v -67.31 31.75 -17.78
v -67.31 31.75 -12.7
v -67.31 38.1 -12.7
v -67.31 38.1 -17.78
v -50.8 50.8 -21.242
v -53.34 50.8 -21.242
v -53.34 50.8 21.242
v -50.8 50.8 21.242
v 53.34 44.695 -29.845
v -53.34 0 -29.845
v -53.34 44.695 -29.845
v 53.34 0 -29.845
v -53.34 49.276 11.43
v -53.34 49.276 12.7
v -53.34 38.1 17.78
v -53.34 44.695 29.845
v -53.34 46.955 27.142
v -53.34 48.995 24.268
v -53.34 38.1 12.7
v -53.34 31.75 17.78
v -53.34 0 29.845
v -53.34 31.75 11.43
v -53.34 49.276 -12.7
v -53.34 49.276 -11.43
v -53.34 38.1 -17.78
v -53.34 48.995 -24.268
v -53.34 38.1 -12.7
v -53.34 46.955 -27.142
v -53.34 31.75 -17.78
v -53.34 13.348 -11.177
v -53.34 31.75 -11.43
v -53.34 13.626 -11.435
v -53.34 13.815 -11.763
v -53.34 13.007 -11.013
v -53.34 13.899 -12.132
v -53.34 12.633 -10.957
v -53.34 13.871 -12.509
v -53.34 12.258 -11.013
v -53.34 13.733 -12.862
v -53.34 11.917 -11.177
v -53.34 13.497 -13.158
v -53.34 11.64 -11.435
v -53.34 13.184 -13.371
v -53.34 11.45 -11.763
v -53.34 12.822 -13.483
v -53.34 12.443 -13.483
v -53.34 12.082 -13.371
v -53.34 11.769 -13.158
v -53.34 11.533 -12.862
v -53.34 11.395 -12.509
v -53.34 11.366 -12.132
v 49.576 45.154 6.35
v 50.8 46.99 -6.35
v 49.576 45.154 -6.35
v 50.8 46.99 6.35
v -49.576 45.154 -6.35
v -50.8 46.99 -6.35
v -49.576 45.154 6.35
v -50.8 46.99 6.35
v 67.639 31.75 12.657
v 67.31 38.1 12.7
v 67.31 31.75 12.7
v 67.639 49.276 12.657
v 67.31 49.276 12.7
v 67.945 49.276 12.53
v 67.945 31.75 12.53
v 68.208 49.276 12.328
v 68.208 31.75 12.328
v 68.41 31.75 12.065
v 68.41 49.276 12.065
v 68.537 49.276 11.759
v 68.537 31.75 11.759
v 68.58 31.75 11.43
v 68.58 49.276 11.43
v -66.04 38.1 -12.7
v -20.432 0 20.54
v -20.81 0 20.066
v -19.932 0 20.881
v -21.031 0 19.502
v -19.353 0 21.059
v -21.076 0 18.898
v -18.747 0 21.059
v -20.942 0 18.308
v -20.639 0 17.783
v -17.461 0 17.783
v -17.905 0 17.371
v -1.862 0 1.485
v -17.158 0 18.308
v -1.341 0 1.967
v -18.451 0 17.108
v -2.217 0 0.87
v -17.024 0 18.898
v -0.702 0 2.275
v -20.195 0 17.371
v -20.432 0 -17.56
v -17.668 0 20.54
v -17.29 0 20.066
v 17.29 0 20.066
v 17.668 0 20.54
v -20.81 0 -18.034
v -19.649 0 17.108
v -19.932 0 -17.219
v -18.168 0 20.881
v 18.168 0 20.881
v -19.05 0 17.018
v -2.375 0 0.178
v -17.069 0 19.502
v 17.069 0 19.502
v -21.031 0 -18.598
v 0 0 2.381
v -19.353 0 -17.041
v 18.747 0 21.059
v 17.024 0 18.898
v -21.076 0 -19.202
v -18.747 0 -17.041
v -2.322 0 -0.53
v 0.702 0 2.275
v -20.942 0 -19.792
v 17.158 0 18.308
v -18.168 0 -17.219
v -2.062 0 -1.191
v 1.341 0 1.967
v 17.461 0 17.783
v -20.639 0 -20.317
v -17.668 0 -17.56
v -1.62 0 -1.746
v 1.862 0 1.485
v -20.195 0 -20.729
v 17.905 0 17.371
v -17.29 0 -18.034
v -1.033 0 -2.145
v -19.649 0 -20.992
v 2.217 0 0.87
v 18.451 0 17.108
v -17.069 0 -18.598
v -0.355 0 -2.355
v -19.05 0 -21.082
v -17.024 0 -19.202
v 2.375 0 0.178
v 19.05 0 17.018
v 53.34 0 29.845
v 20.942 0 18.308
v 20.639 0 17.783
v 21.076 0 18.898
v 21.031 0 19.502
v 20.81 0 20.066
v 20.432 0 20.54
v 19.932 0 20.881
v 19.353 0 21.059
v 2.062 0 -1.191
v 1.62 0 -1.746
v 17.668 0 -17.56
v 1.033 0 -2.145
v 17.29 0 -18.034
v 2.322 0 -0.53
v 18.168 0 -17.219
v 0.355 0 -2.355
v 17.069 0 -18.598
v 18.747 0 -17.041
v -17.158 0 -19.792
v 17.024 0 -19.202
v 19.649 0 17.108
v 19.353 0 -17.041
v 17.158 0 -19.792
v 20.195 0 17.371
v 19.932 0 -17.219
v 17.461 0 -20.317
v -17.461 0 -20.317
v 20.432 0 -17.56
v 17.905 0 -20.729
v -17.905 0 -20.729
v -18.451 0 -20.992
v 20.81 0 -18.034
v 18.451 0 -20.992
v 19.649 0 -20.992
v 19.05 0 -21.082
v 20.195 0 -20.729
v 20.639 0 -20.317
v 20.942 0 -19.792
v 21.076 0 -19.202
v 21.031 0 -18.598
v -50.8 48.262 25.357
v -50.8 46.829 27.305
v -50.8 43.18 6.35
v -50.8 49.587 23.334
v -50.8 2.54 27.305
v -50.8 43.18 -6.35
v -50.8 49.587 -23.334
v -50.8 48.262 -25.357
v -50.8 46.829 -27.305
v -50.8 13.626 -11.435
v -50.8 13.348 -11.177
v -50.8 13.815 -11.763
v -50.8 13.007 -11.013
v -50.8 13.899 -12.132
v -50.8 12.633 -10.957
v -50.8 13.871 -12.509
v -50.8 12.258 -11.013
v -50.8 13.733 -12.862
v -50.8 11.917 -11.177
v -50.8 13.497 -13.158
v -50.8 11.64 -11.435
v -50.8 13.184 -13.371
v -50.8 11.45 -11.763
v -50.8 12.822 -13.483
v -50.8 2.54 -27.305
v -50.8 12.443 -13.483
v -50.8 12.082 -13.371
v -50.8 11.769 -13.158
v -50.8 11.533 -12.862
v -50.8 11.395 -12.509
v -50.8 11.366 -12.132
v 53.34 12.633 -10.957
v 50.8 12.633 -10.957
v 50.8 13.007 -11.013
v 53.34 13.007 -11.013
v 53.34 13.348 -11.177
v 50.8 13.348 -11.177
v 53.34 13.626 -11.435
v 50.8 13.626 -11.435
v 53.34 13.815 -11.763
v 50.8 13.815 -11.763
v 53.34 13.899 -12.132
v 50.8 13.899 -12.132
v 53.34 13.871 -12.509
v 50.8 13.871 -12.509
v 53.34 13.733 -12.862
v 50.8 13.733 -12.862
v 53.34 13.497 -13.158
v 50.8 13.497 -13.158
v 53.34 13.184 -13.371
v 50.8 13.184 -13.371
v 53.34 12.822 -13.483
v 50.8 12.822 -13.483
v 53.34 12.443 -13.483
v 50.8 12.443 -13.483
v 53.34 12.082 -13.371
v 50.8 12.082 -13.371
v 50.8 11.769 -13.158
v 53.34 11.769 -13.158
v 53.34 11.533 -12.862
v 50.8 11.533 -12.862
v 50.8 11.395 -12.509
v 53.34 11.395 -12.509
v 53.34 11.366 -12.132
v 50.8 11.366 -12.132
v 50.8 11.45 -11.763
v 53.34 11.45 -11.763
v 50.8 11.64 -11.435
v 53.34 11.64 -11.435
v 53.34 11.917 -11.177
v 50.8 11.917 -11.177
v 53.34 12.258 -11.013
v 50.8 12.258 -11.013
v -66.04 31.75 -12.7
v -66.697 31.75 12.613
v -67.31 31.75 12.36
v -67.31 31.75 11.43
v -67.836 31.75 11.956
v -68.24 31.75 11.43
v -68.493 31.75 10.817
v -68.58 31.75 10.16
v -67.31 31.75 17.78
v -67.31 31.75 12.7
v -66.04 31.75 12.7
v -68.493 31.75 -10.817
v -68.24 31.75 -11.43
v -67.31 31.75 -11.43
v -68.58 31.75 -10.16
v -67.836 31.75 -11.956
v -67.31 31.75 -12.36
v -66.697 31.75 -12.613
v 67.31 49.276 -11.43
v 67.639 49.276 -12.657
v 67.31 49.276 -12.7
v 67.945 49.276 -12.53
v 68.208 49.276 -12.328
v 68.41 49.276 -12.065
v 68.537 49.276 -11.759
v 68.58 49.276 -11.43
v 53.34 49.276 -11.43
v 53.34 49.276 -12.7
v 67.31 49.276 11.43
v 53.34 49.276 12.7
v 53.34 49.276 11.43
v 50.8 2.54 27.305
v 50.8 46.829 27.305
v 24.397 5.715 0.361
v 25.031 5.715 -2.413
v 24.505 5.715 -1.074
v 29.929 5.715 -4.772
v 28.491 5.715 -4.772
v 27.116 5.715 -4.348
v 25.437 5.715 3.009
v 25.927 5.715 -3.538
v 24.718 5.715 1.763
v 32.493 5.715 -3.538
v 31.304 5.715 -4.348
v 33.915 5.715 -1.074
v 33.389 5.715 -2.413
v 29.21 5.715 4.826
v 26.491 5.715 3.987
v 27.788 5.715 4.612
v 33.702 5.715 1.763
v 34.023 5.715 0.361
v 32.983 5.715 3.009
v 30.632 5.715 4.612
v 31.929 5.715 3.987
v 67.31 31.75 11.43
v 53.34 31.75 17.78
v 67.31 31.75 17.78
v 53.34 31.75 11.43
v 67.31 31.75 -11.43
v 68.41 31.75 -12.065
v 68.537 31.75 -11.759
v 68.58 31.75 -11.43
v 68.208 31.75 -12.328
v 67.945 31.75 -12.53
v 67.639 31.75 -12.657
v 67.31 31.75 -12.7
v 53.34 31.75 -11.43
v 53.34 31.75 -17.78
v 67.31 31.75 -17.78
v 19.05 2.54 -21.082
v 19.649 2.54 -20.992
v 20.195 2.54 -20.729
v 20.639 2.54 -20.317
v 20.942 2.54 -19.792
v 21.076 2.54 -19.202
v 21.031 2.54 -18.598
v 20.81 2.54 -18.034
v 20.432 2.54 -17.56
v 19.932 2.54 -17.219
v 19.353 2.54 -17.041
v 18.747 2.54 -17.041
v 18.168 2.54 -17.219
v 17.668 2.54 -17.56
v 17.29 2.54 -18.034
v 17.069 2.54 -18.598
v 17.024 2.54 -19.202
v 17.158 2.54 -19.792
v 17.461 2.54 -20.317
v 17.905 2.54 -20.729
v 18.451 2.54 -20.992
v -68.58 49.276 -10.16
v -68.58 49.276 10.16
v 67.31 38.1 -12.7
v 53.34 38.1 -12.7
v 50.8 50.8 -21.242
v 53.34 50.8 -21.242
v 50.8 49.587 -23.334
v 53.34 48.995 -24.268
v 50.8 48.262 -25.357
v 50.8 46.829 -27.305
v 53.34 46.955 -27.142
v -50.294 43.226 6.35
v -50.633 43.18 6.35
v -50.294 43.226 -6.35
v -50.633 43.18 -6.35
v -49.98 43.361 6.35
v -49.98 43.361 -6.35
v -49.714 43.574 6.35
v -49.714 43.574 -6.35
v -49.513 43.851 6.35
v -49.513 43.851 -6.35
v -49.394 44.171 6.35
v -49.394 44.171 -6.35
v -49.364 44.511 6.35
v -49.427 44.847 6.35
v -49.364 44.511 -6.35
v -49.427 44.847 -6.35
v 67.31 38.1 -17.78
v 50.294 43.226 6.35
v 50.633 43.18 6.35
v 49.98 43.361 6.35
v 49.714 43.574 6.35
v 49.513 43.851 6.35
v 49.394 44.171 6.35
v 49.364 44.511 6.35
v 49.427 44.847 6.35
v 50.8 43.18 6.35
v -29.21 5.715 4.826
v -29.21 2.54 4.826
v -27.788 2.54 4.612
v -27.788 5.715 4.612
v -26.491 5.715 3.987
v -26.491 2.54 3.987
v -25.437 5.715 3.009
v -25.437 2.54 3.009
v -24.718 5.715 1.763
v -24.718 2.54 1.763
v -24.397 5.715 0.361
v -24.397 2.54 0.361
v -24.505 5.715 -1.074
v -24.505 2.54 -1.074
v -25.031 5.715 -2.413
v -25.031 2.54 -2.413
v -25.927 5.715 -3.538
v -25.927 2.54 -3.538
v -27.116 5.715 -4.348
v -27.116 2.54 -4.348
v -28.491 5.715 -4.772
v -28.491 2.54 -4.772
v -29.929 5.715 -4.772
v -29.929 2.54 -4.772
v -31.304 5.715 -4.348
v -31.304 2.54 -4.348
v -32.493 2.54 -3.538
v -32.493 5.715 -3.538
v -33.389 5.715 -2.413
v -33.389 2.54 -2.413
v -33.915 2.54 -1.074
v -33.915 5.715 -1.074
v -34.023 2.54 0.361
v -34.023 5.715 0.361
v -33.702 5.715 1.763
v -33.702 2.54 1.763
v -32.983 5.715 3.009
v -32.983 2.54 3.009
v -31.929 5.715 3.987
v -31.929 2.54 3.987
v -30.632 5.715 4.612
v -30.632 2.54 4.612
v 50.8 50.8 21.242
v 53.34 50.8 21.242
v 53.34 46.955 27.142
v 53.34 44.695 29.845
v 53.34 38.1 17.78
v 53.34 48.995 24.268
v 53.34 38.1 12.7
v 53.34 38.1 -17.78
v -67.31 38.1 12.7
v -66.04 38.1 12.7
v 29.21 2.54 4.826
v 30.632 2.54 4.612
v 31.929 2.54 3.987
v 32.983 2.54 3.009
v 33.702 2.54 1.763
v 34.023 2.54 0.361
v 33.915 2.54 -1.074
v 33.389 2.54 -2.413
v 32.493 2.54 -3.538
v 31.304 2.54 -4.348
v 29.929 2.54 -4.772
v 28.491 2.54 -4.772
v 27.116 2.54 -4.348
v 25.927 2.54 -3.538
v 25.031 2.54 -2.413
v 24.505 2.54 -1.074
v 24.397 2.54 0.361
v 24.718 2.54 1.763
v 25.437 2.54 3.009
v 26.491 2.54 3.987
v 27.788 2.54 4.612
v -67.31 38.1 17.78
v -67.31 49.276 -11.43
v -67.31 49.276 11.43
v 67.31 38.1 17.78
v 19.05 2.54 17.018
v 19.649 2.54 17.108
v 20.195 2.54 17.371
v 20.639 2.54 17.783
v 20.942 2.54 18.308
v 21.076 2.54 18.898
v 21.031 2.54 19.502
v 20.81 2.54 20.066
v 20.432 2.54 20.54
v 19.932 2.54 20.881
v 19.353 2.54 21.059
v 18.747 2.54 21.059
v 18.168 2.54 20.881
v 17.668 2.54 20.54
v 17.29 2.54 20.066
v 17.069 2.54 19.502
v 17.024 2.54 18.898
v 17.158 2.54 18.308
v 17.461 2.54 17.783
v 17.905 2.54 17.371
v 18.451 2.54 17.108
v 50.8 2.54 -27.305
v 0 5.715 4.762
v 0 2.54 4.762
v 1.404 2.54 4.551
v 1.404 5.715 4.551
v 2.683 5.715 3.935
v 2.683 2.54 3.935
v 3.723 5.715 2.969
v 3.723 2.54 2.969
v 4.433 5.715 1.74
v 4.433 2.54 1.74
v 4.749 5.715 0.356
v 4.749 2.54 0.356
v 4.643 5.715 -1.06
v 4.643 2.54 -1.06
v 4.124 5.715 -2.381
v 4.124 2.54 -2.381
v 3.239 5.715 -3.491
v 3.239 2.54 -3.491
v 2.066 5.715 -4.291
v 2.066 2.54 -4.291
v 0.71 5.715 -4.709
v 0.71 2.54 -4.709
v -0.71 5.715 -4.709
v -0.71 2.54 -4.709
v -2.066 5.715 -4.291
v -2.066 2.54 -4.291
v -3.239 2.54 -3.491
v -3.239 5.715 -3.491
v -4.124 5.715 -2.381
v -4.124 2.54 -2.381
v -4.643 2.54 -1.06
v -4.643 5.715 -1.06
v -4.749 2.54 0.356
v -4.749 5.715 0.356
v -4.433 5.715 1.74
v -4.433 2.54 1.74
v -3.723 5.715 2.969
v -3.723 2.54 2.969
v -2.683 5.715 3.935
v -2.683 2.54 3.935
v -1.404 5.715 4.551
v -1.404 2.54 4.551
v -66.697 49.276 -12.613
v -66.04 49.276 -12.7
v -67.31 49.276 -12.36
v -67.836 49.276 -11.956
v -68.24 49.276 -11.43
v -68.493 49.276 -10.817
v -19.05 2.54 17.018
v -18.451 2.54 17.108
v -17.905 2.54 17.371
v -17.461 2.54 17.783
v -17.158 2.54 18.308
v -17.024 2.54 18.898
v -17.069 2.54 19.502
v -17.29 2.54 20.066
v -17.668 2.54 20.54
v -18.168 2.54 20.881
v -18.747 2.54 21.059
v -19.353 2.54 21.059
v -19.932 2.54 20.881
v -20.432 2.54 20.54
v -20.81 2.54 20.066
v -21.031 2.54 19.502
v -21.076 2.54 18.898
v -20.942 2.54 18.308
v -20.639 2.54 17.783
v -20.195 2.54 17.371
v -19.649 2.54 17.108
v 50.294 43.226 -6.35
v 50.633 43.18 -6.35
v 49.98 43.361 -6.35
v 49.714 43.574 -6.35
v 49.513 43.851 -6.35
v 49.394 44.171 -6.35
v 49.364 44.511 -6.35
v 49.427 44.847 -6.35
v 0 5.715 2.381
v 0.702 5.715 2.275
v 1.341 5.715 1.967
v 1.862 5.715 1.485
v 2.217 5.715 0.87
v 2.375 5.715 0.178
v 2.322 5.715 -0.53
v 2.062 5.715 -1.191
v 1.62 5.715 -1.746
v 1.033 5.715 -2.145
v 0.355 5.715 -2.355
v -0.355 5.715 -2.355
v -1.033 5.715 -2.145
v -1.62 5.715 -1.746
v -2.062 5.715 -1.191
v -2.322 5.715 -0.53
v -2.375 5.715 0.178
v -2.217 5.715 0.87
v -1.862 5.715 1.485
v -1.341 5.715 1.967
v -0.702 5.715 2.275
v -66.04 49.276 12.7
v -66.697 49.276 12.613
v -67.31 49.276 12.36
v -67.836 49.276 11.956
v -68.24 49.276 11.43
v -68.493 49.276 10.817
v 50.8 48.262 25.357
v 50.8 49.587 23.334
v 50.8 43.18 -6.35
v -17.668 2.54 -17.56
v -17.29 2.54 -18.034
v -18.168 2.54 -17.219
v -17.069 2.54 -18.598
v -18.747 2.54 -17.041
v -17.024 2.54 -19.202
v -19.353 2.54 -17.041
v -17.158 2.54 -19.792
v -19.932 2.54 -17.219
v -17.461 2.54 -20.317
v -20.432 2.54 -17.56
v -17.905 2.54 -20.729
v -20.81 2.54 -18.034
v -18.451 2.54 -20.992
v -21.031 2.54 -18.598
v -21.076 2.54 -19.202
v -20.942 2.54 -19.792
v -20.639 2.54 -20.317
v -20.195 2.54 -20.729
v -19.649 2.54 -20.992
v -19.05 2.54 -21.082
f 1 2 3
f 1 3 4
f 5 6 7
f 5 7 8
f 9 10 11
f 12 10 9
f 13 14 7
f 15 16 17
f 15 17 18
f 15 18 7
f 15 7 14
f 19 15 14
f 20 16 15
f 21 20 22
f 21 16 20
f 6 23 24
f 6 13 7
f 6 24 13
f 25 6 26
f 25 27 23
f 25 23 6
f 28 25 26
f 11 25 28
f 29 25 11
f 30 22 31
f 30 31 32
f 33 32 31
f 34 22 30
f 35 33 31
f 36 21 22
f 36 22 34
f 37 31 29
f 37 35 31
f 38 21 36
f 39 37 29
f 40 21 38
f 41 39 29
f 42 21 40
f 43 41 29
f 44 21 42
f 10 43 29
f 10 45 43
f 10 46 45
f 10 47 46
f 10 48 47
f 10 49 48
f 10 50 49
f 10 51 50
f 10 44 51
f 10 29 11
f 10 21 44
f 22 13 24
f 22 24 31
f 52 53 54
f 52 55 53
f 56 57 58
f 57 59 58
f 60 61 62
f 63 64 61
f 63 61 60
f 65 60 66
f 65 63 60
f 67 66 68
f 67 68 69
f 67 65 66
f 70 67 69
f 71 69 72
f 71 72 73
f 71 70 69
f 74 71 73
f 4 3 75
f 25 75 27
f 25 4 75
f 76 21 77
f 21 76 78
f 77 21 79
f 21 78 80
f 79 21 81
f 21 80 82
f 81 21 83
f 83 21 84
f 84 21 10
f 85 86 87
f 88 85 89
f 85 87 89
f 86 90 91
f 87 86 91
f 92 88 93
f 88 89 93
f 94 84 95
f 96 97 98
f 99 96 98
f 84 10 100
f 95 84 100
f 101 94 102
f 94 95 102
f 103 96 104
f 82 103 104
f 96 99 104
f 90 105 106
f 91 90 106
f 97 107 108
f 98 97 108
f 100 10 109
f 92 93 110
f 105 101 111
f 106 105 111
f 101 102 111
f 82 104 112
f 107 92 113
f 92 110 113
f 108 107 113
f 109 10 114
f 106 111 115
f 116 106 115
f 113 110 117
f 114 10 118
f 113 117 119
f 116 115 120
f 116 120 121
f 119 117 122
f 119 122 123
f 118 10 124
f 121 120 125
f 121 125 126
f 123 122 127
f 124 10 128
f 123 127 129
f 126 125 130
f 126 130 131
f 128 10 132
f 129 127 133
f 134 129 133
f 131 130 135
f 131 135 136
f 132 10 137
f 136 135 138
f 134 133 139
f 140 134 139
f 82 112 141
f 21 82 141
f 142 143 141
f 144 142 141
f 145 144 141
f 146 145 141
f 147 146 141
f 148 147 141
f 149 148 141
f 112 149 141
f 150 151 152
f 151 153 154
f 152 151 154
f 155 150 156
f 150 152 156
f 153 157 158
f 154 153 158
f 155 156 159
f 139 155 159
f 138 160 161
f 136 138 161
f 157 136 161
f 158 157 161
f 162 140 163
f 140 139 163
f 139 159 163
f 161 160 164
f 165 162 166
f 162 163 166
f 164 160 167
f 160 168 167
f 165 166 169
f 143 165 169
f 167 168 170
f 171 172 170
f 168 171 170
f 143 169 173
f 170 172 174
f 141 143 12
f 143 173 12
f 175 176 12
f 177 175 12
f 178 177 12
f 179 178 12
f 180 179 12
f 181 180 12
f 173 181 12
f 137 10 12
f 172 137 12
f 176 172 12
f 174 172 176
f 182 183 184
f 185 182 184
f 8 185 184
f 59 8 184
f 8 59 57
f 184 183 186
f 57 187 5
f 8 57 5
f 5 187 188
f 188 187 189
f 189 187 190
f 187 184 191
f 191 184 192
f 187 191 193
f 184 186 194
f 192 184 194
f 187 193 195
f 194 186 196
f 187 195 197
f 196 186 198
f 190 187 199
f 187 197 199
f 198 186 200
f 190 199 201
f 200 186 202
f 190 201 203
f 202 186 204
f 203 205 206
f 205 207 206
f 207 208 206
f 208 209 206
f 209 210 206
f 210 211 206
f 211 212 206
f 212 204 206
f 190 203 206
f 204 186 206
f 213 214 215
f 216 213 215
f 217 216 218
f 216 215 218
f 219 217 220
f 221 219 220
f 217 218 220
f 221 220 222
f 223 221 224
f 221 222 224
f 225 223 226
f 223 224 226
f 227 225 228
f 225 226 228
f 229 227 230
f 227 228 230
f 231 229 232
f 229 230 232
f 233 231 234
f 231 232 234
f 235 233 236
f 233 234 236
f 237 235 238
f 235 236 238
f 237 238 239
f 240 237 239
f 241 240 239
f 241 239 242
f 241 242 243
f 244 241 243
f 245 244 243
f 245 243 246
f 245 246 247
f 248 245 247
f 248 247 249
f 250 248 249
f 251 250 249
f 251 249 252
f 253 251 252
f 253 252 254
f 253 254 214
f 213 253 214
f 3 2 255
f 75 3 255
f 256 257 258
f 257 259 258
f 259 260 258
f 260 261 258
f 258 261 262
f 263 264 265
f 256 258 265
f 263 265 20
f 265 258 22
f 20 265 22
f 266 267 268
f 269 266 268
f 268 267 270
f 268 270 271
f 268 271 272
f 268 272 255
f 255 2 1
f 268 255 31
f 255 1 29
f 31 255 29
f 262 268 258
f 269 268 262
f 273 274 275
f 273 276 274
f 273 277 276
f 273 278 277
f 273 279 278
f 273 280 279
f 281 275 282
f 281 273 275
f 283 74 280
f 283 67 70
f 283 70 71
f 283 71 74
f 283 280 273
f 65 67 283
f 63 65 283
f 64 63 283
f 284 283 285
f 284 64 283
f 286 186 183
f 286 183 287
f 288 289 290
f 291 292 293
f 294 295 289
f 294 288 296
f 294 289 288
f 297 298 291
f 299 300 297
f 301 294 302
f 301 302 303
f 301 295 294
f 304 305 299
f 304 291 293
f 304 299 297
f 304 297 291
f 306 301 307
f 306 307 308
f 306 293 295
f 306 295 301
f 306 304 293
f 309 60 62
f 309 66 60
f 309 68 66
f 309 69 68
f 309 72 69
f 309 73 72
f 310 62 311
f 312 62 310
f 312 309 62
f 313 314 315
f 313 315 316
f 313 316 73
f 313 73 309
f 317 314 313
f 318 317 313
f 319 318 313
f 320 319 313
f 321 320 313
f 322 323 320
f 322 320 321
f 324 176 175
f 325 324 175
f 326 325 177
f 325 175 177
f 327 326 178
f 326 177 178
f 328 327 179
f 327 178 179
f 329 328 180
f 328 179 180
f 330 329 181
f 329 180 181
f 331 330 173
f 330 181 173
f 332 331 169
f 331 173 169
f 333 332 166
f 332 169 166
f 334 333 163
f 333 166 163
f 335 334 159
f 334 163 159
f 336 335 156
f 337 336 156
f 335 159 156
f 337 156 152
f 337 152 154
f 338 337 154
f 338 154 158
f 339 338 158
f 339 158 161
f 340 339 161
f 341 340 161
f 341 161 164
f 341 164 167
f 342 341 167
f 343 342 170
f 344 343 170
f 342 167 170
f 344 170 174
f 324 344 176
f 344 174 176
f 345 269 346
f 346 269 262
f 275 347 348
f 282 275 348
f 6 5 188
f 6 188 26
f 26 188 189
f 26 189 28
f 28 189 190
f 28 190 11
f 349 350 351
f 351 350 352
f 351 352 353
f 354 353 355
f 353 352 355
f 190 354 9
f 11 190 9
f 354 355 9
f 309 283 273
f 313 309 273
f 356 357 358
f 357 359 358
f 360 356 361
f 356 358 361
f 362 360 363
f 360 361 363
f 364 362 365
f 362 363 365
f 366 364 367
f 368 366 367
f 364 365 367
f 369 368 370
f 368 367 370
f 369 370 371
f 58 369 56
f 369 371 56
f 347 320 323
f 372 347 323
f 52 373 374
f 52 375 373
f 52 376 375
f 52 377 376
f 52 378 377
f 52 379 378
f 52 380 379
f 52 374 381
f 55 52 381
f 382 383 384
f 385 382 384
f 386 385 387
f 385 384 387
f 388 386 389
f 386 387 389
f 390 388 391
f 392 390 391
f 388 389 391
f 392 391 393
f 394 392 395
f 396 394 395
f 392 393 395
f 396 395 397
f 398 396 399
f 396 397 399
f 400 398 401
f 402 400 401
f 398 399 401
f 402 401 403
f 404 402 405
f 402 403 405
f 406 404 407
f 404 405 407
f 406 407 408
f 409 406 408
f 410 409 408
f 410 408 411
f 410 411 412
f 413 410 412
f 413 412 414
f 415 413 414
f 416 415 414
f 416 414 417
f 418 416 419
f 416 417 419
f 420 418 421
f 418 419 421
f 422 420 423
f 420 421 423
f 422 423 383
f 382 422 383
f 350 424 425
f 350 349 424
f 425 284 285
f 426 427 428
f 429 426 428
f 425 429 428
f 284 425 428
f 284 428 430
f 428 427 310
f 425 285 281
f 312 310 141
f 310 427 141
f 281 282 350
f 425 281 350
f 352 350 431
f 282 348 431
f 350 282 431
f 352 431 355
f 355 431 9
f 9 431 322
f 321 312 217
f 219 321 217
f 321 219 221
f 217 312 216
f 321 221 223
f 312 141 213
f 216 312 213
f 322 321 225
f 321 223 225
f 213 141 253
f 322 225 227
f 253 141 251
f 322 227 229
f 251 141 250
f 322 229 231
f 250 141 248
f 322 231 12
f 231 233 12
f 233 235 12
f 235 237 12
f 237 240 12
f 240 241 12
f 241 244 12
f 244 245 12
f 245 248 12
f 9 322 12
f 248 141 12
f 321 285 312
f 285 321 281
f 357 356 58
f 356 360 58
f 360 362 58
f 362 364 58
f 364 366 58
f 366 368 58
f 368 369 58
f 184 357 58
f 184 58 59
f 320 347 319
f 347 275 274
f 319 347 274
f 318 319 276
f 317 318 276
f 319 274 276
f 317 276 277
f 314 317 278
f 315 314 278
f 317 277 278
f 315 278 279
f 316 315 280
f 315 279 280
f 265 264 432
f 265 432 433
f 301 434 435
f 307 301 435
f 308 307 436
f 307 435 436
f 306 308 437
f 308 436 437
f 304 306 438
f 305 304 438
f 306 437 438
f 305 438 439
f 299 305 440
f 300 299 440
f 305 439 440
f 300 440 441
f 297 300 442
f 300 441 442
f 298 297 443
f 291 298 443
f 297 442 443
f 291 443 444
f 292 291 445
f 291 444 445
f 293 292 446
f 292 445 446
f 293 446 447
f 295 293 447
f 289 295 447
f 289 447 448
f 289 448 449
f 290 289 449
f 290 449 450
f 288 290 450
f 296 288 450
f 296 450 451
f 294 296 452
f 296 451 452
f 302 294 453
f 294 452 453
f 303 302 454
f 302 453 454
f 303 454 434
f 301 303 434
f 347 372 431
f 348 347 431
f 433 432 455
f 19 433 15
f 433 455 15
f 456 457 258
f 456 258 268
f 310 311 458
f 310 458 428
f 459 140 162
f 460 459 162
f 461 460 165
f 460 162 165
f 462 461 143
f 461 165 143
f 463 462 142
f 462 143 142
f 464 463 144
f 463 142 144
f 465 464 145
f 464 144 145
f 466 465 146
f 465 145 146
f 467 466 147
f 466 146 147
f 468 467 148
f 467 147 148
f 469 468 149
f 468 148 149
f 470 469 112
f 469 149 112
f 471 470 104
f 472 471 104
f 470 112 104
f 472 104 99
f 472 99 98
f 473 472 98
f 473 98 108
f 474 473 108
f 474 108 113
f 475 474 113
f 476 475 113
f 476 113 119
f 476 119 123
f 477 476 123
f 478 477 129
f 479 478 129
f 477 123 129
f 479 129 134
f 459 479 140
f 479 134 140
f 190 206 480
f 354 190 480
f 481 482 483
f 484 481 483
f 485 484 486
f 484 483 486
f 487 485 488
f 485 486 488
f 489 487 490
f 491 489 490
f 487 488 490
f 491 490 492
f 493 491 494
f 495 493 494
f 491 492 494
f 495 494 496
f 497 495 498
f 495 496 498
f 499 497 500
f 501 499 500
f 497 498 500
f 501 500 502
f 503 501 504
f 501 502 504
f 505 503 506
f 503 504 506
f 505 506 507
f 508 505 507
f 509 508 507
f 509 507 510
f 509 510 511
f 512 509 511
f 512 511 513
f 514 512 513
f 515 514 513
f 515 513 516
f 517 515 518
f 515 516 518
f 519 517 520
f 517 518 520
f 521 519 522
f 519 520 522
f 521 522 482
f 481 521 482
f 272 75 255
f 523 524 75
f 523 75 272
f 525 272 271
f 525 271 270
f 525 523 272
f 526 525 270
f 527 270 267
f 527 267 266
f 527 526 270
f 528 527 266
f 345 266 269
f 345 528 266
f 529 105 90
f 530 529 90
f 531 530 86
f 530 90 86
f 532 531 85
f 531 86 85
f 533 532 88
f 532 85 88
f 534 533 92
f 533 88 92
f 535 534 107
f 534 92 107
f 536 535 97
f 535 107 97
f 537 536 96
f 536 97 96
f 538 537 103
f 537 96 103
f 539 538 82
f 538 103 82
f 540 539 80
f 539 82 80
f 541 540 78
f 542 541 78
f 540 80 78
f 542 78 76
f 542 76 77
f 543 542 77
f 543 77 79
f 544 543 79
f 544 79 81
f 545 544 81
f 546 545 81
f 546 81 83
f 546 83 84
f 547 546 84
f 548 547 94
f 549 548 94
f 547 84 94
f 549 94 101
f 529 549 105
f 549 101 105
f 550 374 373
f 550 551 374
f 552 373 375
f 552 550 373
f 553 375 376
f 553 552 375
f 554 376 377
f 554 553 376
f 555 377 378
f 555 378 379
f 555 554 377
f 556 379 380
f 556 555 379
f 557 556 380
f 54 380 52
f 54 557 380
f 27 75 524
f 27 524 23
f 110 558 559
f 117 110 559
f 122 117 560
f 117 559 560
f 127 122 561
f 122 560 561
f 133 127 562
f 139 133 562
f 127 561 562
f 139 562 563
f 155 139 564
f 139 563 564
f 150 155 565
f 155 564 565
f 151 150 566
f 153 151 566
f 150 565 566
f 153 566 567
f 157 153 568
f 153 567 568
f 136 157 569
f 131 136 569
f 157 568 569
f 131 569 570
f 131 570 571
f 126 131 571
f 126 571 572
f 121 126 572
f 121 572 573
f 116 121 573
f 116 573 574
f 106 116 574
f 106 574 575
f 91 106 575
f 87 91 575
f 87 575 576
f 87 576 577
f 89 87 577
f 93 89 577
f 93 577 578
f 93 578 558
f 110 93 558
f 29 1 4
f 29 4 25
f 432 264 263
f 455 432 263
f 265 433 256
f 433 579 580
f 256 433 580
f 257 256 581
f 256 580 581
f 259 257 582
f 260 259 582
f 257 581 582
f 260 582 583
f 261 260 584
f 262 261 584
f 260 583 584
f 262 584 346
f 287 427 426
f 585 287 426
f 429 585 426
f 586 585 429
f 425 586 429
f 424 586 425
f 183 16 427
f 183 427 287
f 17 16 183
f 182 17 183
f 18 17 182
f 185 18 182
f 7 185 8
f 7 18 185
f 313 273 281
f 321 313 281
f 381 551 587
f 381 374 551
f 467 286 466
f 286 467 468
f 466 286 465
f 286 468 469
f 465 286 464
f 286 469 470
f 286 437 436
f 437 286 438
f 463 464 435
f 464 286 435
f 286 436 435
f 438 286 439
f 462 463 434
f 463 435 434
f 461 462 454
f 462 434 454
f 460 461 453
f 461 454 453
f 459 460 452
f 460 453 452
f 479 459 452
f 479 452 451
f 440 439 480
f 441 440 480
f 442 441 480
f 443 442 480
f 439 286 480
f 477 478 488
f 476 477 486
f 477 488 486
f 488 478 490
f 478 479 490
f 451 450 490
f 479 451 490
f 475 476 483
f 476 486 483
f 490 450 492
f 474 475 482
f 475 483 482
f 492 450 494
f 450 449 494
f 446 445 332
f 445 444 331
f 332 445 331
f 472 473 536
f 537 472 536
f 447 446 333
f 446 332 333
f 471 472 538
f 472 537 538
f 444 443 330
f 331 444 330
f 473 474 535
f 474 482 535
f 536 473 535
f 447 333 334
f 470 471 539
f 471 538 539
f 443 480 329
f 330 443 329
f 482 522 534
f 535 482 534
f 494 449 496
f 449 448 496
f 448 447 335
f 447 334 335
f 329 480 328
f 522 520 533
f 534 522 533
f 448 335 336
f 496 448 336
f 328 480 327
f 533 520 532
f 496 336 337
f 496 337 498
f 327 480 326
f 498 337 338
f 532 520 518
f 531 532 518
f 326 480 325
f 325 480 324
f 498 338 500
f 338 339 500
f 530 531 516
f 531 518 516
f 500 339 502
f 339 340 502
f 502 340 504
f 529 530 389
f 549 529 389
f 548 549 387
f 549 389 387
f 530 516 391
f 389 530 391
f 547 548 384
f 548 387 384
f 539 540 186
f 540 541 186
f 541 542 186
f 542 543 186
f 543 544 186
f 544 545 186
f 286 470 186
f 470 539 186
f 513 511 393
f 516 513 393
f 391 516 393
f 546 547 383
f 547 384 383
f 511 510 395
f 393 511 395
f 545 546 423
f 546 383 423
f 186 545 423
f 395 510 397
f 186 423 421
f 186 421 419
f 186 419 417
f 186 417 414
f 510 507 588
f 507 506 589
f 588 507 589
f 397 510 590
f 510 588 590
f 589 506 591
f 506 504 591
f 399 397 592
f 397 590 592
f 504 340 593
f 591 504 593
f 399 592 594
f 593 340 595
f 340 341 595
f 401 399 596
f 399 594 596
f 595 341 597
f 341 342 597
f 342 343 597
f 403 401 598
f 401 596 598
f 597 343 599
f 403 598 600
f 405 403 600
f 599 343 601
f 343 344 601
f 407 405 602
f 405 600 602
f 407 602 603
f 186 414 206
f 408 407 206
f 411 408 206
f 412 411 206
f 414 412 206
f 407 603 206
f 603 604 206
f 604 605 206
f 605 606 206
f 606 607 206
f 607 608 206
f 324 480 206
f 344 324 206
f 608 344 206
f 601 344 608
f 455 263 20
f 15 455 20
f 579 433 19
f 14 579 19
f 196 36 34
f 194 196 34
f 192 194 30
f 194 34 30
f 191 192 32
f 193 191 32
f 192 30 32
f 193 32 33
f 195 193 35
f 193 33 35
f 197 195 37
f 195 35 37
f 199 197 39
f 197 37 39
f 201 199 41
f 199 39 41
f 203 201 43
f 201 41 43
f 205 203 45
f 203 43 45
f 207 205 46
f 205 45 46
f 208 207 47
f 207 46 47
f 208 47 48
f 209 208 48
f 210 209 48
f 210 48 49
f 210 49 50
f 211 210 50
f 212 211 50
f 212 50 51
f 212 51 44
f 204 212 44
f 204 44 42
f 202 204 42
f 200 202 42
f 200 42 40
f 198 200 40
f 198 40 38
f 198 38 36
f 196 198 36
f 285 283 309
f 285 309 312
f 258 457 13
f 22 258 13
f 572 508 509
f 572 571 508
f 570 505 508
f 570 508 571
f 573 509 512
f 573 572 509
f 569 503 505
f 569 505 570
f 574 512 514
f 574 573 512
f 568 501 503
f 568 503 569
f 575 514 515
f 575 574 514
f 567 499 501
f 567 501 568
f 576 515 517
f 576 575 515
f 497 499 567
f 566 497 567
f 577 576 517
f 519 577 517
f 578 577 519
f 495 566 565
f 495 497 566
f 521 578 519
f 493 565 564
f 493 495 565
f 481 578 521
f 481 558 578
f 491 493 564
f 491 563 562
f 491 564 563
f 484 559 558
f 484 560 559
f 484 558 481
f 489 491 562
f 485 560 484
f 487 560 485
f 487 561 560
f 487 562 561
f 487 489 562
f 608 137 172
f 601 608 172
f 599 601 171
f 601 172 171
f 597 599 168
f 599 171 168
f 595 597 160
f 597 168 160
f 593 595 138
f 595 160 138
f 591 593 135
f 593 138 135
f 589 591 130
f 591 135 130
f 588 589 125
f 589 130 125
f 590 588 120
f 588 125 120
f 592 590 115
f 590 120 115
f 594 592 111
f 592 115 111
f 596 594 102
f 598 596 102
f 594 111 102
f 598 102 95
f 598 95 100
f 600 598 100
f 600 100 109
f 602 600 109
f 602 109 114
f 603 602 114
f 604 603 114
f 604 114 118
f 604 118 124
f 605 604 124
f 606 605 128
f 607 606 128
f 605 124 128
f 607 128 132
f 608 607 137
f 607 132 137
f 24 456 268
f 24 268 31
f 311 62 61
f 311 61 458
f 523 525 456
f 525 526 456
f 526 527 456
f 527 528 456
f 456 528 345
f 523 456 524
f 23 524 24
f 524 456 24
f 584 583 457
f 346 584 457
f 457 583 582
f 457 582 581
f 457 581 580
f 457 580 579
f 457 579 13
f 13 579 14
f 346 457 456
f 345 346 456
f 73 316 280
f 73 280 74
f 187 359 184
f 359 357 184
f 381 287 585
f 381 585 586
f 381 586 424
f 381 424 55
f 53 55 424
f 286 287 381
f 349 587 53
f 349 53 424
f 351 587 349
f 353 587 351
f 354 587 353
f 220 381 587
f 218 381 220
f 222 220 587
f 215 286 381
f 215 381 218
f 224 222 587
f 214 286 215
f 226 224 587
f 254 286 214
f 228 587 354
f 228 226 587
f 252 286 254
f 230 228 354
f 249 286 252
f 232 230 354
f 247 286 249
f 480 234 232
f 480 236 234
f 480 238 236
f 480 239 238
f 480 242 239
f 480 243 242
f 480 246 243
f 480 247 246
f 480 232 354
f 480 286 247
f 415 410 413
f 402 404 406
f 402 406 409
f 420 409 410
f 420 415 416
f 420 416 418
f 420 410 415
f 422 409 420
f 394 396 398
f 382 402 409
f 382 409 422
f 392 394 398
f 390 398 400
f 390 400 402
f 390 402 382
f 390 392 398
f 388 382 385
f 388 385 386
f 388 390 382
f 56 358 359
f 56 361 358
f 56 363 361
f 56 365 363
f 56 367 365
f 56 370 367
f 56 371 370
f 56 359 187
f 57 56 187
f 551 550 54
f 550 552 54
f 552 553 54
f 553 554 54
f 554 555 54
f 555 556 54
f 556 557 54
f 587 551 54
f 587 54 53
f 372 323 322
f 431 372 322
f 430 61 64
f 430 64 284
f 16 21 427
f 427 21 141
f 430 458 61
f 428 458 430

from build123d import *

# Parameters (mm, degrees)
SKETCH1_W               = 106.68
SKETCH1_H               = 59.69
SKETCH1_W_2             = 101.6
SKETCH1_H_2             = 54.61
BOSS_EXTRUDE1_DEPTH     = 50.8
SKETCH2_W               = 106.68
SKETCH2_H               = 59.69
BOSS_EXTRUDE2_DEPTH     = 2.54
SKETCH3_R               = 2.032
CUT_EXTRUDE1_DEPTH      = 2.54
BOSS_EXTRUDE3_START     = -31.75
SKETCH5_W               = 15.24
SKETCH5_H               = 25.4
BOSS_EXTRUDE3_DEPTH     = 17.526
SKETCH6_W               = 13.97
SKETCH6_H               = 22.86
CUT_EXTRUDE2_DEPTH      = 23.114
SKETCH8_R               = 1.27
CUT_EXTRUDE3_DEPTH      = 122.833947508
FILLET3_R               = 2.54
SKETCH9_R               = 4.7625
BOSS_EXTRUDE4_DEPTH     = 3.175
SKETCH11_R              = 2.38125
CUT_EXTRUDE4_DEPTH      = 88.330393621
BOSS_EXTRUDE5_DEPTH     = 6.35
FILLET4_R               = 1.27
FILLET4_OF_MIRROR2_R    = 1.27
FILLET6_R               = 1.27
SKETCH14_W              = 13.97
SKETCH14_H              = 5.08
BOSS_EXTRUDE6_DEPTH     = 6.35
MIRROR6_COPY_1_SKETCH_W = 13.97
MIRROR6_COPY_1_SKETCH_H = 5.08
MIRROR6_COPY_1_DEPTH    = 6.35
CUT_EXTRUDE5_DEPTH      = 127
SKETCH15_R              = 4.826
BOSS_EXTRUDE7_DEPTH     = 3.175


with BuildPart() as part:
    # Sketch1 → Boss-Extrude1 (new body)
    with BuildSketch(Plane(origin=(0, 0, 0), x_dir=(1, 0, 0), z_dir=(0, 1, 0))):
        Rectangle(SKETCH1_W, SKETCH1_H)
        Rectangle(SKETCH1_W_2, SKETCH1_H_2, mode=Mode.SUBTRACT)
    extrude(amount=BOSS_EXTRUDE1_DEPTH)

    # Sketch2 → Boss-Extrude2 (add)
    with BuildSketch(Plane(origin=(0, 0, 0), x_dir=(-1, 0, 0), z_dir=(0, -1, 0))):
        Rectangle(SKETCH2_W, SKETCH2_H)
    extrude(amount=-BOSS_EXTRUDE2_DEPTH)

    # Sketch3 → Cut-Extrude1 (cut)
    with BuildSketch(Plane.XZ):
        with Locations(Location((-19.05, 19.05, 0), (0, 0, 270))):
            Circle(SKETCH3_R)
        with Locations(Location((19.05, 19.05, 0), (0, 0, 270))):
            Circle(SKETCH3_R)
        with Locations(Location((19.05, -19.05, 0), (0, 0, 270))):
            Circle(SKETCH3_R)
        with Locations(Location((-19.05, -19.05, 0), (0, 0, 270))):
            Circle(SKETCH3_R)
    extrude(amount=-CUT_EXTRUDE1_DEPTH, mode=Mode.SUBTRACT)

    # Sketch5 → Boss-Extrude3 (add)
    with BuildSketch(Plane.XZ.offset(BOSS_EXTRUDE3_START)):
        with Locations((-60.96, 0)):
            Rectangle(SKETCH5_W, SKETCH5_H)
    boss_extrude3 = extrude(amount=-BOSS_EXTRUDE3_DEPTH)

    # Sketch6 → Cut-Extrude2 (cut)
    with BuildSketch(Plane(origin=(0, 49.276, 0), x_dir=(1, 0, 0), z_dir=(0, 1, 0))):
        with Locations((-60.325, 0)):
            Rectangle(SKETCH6_W, SKETCH6_H)
    cut_extrude2 = extrude(amount=-CUT_EXTRUDE2_DEPTH, mode=Mode.SUBTRACT)

    # Sketch8 → Cut-Extrude3 (cut)
    with BuildSketch(Plane(origin=(-53.34, -47.057304482, -0.79669661), x_dir=(0, 0, 1), z_dir=(-1, 0, 0))):
        with Locations((-11.43, 59.69)):
            Circle(SKETCH8_R)
    extrude(amount=-CUT_EXTRUDE3_DEPTH, mode=Mode.SUBTRACT)

    # Fillet3
    fillet3_edges = [part.edges().sort_by_distance(p)[0] for p in [
        (-68.58, 40.513, -12.7),
        (-68.58, 40.513, 12.7),
    ]]
    fillet(fillet3_edges, radius=FILLET3_R)

    # Sketch9 → Boss-Extrude4 (add)
    with BuildSketch(Plane(origin=(0, 2.54, 0), x_dir=(1, 0, 0), z_dir=(0, 1, 0))):
        with Locations(Location((0, 0, 0), (0, 0, 270))):
            Circle(SKETCH9_R)
    extrude(amount=BOSS_EXTRUDE4_DEPTH)

    # Sketch11 → Cut-Extrude4 (cut, through all)
    with BuildSketch(Plane(origin=(0, 5.715, 0), x_dir=(1, 0, 0), z_dir=(0, 1, 0))):
        with Locations(Location((0, 0, 0), (0, 0, 270))):
            Circle(SKETCH11_R)
    extrude(amount=-CUT_EXTRUDE4_DEPTH, mode=Mode.SUBTRACT)

    # Sketch13 → Boss-Extrude5 (add, symmetric)
    with BuildSketch(Plane.XY):
        Polygon((-50.8, 46.99), (-48.26, 43.18), (-50.8, 43.18), align=None)
    boss_extrude5 = extrude(amount=BOSS_EXTRUDE5_DEPTH, both=True)

    # Fillet4
    fillet4_edges = [part.edges().sort_by_distance(p)[0] for p in [
        (-48.26, 43.18, 0),
    ]]
    fillet(fillet4_edges, radius=FILLET4_R)

    # Mirror2: Boss-Extrude5 across plane
    add(boss_extrude5.mirror(Plane(origin=(0, 0, 0), x_dir=(0, 0, 1), z_dir=(1, 0, 0))))

    # Fillet4 of Mirror2
    fillet4_of_mirror2_edges = [part.edges().sort_by_distance(p)[0] for p in [
        (48.26, 43.18, 0),
    ]]
    fillet(fillet4_of_mirror2_edges, radius=FILLET4_OF_MIRROR2_R)

    # Mirror4: Boss-Extrude3, Cut-Extrude2 across plane
    add(boss_extrude3.mirror(Plane(origin=(0, 0, 0), x_dir=(0, 0, 1), z_dir=(1, 0, 0))))
    add(cut_extrude2.mirror(Plane(origin=(0, 0, 0), x_dir=(0, 0, 1), z_dir=(1, 0, 0))), mode=Mode.SUBTRACT)

    # Fillet6
    fillet6_edges = [part.edges().sort_by_distance(p)[0] for p in [
        (68.58, 40.513, 12.7),
        (68.58, 40.513, -12.7),
    ]]
    fillet(fillet6_edges, radius=FILLET6_R)

    # Sketch14 → Boss-Extrude6 (add)
    with BuildSketch(Plane.XZ.offset(-31.75)):
        with Locations((-60.325, 15.24)):
            Rectangle(SKETCH14_W, SKETCH14_H)
    boss_extrude6 = extrude(amount=-BOSS_EXTRUDE6_DEPTH)

    # Mirror5: Boss-Extrude6 across plane
    add(boss_extrude6.mirror(Plane.XY))

    # Mirror6: Boss-Extrude6 across plane
    add(boss_extrude6.mirror(Plane(origin=(0, 0, 0), x_dir=(0, 0, 1), z_dir=(1, 0, 0))))

    # Mirror6 copy 1 sketch → Mirror6 copy 1 (add)
    with BuildSketch(Plane(origin=(0, 31.75, 0), x_dir=(-1, 0, 0), z_dir=(0, -1, 0))):
        with Locations((-60.325, 15.24)):
            Rectangle(MIRROR6_COPY_1_SKETCH_W, MIRROR6_COPY_1_SKETCH_H)
    extrude(amount=-MIRROR6_COPY_1_DEPTH)

    # Sketch12 → Cut-Extrude5 (cut, symmetric)
    with BuildSketch(Plane(origin=(0, 0, 0), x_dir=(0, 0, -1), z_dir=(1, 0, 0))):
        with BuildLine():
            Line((-29.845, 50.8), (-29.845, 44.694509634))
            ThreePointArc((-29.845, 44.694509634), (-25.725135532, 48.003392702), (-21.241724106, 50.8))
            Line((-21.241724106, 50.8), (-29.845, 50.8))
        make_face()
        with BuildLine():
            Line((29.845, 50.8), (21.241724106, 50.8))
            ThreePointArc((21.241724106, 50.8), (25.725135532, 48.003392702), (29.845, 44.694509634))
            Line((29.845, 44.694509634), (29.845, 50.8))
        make_face()
    extrude(amount=CUT_EXTRUDE5_DEPTH, both=True, mode=Mode.SUBTRACT)

    # Sketch15 → Boss-Extrude7 (add)
    with BuildSketch(Plane(origin=(0, 2.54, 0), x_dir=(1, 0, 0), z_dir=(0, 1, 0))):
        with Locations(Location((-29.21, 0, 0), (0, 0, 270))):
            Circle(SKETCH15_R)
        with Locations(Location((29.21, 0, 0), (0, 0, 270))):
            Circle(SKETCH15_R)
    extrude(amount=BOSS_EXTRUDE7_DEPTH)


solid = part.part
